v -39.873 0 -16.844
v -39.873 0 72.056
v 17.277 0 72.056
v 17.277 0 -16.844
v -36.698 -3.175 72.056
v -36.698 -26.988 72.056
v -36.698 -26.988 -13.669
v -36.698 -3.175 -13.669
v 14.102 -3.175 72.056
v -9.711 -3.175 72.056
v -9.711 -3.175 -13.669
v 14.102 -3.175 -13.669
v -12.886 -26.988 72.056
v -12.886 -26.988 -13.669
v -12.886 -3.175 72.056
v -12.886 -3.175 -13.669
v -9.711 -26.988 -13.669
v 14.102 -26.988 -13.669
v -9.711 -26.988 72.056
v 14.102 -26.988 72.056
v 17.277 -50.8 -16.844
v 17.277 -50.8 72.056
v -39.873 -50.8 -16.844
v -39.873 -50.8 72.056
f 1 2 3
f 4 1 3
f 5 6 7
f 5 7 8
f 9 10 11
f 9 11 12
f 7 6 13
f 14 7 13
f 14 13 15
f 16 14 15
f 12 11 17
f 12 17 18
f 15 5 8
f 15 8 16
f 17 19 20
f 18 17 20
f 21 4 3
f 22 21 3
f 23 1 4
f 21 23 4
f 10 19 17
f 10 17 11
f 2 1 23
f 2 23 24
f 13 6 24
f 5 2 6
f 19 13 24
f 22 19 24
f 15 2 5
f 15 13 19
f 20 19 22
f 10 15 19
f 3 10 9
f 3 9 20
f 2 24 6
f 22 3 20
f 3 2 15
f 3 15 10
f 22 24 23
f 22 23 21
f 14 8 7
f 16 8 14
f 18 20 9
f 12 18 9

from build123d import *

# Parameters (mm, degrees)
F0_W     = 57.15
F0_H     = 88.9
F1_DEPTH = 50.8
F2_W     = 23.8125
F2_H     = 23.8125
F3_DEPTH = 85.725
F5_W     = 23.8125
F5_H     = 23.8125
F6_DEPTH = 85.725


with BuildPart() as f1:
    # F0 (on Front) → F1 (new body)
    with BuildSketch(Plane.XZ):
        with Locations((-11.298306, 27.606365)):
            Rectangle(F0_W, F0_H)
    extrude(amount=F1_DEPTH)

    # F2 (on face) → F3 (cut)
    with BuildSketch(Plane.XY.offset(72.056365)):
        with Locations((-24.792056, -15.08125)):
            Rectangle(F2_W, F2_H)
    extrude(amount=-F3_DEPTH, mode=Mode.SUBTRACT)

    # F5 (on face) → F6 (cut)
    with BuildSketch(Plane.XY.offset(72.056365)):
        with Locations((2.195444, -15.08125)):
            Rectangle(F5_W, F5_H)
    extrude(amount=-F6_DEPTH, mode=Mode.SUBTRACT)


solid = f1.part
